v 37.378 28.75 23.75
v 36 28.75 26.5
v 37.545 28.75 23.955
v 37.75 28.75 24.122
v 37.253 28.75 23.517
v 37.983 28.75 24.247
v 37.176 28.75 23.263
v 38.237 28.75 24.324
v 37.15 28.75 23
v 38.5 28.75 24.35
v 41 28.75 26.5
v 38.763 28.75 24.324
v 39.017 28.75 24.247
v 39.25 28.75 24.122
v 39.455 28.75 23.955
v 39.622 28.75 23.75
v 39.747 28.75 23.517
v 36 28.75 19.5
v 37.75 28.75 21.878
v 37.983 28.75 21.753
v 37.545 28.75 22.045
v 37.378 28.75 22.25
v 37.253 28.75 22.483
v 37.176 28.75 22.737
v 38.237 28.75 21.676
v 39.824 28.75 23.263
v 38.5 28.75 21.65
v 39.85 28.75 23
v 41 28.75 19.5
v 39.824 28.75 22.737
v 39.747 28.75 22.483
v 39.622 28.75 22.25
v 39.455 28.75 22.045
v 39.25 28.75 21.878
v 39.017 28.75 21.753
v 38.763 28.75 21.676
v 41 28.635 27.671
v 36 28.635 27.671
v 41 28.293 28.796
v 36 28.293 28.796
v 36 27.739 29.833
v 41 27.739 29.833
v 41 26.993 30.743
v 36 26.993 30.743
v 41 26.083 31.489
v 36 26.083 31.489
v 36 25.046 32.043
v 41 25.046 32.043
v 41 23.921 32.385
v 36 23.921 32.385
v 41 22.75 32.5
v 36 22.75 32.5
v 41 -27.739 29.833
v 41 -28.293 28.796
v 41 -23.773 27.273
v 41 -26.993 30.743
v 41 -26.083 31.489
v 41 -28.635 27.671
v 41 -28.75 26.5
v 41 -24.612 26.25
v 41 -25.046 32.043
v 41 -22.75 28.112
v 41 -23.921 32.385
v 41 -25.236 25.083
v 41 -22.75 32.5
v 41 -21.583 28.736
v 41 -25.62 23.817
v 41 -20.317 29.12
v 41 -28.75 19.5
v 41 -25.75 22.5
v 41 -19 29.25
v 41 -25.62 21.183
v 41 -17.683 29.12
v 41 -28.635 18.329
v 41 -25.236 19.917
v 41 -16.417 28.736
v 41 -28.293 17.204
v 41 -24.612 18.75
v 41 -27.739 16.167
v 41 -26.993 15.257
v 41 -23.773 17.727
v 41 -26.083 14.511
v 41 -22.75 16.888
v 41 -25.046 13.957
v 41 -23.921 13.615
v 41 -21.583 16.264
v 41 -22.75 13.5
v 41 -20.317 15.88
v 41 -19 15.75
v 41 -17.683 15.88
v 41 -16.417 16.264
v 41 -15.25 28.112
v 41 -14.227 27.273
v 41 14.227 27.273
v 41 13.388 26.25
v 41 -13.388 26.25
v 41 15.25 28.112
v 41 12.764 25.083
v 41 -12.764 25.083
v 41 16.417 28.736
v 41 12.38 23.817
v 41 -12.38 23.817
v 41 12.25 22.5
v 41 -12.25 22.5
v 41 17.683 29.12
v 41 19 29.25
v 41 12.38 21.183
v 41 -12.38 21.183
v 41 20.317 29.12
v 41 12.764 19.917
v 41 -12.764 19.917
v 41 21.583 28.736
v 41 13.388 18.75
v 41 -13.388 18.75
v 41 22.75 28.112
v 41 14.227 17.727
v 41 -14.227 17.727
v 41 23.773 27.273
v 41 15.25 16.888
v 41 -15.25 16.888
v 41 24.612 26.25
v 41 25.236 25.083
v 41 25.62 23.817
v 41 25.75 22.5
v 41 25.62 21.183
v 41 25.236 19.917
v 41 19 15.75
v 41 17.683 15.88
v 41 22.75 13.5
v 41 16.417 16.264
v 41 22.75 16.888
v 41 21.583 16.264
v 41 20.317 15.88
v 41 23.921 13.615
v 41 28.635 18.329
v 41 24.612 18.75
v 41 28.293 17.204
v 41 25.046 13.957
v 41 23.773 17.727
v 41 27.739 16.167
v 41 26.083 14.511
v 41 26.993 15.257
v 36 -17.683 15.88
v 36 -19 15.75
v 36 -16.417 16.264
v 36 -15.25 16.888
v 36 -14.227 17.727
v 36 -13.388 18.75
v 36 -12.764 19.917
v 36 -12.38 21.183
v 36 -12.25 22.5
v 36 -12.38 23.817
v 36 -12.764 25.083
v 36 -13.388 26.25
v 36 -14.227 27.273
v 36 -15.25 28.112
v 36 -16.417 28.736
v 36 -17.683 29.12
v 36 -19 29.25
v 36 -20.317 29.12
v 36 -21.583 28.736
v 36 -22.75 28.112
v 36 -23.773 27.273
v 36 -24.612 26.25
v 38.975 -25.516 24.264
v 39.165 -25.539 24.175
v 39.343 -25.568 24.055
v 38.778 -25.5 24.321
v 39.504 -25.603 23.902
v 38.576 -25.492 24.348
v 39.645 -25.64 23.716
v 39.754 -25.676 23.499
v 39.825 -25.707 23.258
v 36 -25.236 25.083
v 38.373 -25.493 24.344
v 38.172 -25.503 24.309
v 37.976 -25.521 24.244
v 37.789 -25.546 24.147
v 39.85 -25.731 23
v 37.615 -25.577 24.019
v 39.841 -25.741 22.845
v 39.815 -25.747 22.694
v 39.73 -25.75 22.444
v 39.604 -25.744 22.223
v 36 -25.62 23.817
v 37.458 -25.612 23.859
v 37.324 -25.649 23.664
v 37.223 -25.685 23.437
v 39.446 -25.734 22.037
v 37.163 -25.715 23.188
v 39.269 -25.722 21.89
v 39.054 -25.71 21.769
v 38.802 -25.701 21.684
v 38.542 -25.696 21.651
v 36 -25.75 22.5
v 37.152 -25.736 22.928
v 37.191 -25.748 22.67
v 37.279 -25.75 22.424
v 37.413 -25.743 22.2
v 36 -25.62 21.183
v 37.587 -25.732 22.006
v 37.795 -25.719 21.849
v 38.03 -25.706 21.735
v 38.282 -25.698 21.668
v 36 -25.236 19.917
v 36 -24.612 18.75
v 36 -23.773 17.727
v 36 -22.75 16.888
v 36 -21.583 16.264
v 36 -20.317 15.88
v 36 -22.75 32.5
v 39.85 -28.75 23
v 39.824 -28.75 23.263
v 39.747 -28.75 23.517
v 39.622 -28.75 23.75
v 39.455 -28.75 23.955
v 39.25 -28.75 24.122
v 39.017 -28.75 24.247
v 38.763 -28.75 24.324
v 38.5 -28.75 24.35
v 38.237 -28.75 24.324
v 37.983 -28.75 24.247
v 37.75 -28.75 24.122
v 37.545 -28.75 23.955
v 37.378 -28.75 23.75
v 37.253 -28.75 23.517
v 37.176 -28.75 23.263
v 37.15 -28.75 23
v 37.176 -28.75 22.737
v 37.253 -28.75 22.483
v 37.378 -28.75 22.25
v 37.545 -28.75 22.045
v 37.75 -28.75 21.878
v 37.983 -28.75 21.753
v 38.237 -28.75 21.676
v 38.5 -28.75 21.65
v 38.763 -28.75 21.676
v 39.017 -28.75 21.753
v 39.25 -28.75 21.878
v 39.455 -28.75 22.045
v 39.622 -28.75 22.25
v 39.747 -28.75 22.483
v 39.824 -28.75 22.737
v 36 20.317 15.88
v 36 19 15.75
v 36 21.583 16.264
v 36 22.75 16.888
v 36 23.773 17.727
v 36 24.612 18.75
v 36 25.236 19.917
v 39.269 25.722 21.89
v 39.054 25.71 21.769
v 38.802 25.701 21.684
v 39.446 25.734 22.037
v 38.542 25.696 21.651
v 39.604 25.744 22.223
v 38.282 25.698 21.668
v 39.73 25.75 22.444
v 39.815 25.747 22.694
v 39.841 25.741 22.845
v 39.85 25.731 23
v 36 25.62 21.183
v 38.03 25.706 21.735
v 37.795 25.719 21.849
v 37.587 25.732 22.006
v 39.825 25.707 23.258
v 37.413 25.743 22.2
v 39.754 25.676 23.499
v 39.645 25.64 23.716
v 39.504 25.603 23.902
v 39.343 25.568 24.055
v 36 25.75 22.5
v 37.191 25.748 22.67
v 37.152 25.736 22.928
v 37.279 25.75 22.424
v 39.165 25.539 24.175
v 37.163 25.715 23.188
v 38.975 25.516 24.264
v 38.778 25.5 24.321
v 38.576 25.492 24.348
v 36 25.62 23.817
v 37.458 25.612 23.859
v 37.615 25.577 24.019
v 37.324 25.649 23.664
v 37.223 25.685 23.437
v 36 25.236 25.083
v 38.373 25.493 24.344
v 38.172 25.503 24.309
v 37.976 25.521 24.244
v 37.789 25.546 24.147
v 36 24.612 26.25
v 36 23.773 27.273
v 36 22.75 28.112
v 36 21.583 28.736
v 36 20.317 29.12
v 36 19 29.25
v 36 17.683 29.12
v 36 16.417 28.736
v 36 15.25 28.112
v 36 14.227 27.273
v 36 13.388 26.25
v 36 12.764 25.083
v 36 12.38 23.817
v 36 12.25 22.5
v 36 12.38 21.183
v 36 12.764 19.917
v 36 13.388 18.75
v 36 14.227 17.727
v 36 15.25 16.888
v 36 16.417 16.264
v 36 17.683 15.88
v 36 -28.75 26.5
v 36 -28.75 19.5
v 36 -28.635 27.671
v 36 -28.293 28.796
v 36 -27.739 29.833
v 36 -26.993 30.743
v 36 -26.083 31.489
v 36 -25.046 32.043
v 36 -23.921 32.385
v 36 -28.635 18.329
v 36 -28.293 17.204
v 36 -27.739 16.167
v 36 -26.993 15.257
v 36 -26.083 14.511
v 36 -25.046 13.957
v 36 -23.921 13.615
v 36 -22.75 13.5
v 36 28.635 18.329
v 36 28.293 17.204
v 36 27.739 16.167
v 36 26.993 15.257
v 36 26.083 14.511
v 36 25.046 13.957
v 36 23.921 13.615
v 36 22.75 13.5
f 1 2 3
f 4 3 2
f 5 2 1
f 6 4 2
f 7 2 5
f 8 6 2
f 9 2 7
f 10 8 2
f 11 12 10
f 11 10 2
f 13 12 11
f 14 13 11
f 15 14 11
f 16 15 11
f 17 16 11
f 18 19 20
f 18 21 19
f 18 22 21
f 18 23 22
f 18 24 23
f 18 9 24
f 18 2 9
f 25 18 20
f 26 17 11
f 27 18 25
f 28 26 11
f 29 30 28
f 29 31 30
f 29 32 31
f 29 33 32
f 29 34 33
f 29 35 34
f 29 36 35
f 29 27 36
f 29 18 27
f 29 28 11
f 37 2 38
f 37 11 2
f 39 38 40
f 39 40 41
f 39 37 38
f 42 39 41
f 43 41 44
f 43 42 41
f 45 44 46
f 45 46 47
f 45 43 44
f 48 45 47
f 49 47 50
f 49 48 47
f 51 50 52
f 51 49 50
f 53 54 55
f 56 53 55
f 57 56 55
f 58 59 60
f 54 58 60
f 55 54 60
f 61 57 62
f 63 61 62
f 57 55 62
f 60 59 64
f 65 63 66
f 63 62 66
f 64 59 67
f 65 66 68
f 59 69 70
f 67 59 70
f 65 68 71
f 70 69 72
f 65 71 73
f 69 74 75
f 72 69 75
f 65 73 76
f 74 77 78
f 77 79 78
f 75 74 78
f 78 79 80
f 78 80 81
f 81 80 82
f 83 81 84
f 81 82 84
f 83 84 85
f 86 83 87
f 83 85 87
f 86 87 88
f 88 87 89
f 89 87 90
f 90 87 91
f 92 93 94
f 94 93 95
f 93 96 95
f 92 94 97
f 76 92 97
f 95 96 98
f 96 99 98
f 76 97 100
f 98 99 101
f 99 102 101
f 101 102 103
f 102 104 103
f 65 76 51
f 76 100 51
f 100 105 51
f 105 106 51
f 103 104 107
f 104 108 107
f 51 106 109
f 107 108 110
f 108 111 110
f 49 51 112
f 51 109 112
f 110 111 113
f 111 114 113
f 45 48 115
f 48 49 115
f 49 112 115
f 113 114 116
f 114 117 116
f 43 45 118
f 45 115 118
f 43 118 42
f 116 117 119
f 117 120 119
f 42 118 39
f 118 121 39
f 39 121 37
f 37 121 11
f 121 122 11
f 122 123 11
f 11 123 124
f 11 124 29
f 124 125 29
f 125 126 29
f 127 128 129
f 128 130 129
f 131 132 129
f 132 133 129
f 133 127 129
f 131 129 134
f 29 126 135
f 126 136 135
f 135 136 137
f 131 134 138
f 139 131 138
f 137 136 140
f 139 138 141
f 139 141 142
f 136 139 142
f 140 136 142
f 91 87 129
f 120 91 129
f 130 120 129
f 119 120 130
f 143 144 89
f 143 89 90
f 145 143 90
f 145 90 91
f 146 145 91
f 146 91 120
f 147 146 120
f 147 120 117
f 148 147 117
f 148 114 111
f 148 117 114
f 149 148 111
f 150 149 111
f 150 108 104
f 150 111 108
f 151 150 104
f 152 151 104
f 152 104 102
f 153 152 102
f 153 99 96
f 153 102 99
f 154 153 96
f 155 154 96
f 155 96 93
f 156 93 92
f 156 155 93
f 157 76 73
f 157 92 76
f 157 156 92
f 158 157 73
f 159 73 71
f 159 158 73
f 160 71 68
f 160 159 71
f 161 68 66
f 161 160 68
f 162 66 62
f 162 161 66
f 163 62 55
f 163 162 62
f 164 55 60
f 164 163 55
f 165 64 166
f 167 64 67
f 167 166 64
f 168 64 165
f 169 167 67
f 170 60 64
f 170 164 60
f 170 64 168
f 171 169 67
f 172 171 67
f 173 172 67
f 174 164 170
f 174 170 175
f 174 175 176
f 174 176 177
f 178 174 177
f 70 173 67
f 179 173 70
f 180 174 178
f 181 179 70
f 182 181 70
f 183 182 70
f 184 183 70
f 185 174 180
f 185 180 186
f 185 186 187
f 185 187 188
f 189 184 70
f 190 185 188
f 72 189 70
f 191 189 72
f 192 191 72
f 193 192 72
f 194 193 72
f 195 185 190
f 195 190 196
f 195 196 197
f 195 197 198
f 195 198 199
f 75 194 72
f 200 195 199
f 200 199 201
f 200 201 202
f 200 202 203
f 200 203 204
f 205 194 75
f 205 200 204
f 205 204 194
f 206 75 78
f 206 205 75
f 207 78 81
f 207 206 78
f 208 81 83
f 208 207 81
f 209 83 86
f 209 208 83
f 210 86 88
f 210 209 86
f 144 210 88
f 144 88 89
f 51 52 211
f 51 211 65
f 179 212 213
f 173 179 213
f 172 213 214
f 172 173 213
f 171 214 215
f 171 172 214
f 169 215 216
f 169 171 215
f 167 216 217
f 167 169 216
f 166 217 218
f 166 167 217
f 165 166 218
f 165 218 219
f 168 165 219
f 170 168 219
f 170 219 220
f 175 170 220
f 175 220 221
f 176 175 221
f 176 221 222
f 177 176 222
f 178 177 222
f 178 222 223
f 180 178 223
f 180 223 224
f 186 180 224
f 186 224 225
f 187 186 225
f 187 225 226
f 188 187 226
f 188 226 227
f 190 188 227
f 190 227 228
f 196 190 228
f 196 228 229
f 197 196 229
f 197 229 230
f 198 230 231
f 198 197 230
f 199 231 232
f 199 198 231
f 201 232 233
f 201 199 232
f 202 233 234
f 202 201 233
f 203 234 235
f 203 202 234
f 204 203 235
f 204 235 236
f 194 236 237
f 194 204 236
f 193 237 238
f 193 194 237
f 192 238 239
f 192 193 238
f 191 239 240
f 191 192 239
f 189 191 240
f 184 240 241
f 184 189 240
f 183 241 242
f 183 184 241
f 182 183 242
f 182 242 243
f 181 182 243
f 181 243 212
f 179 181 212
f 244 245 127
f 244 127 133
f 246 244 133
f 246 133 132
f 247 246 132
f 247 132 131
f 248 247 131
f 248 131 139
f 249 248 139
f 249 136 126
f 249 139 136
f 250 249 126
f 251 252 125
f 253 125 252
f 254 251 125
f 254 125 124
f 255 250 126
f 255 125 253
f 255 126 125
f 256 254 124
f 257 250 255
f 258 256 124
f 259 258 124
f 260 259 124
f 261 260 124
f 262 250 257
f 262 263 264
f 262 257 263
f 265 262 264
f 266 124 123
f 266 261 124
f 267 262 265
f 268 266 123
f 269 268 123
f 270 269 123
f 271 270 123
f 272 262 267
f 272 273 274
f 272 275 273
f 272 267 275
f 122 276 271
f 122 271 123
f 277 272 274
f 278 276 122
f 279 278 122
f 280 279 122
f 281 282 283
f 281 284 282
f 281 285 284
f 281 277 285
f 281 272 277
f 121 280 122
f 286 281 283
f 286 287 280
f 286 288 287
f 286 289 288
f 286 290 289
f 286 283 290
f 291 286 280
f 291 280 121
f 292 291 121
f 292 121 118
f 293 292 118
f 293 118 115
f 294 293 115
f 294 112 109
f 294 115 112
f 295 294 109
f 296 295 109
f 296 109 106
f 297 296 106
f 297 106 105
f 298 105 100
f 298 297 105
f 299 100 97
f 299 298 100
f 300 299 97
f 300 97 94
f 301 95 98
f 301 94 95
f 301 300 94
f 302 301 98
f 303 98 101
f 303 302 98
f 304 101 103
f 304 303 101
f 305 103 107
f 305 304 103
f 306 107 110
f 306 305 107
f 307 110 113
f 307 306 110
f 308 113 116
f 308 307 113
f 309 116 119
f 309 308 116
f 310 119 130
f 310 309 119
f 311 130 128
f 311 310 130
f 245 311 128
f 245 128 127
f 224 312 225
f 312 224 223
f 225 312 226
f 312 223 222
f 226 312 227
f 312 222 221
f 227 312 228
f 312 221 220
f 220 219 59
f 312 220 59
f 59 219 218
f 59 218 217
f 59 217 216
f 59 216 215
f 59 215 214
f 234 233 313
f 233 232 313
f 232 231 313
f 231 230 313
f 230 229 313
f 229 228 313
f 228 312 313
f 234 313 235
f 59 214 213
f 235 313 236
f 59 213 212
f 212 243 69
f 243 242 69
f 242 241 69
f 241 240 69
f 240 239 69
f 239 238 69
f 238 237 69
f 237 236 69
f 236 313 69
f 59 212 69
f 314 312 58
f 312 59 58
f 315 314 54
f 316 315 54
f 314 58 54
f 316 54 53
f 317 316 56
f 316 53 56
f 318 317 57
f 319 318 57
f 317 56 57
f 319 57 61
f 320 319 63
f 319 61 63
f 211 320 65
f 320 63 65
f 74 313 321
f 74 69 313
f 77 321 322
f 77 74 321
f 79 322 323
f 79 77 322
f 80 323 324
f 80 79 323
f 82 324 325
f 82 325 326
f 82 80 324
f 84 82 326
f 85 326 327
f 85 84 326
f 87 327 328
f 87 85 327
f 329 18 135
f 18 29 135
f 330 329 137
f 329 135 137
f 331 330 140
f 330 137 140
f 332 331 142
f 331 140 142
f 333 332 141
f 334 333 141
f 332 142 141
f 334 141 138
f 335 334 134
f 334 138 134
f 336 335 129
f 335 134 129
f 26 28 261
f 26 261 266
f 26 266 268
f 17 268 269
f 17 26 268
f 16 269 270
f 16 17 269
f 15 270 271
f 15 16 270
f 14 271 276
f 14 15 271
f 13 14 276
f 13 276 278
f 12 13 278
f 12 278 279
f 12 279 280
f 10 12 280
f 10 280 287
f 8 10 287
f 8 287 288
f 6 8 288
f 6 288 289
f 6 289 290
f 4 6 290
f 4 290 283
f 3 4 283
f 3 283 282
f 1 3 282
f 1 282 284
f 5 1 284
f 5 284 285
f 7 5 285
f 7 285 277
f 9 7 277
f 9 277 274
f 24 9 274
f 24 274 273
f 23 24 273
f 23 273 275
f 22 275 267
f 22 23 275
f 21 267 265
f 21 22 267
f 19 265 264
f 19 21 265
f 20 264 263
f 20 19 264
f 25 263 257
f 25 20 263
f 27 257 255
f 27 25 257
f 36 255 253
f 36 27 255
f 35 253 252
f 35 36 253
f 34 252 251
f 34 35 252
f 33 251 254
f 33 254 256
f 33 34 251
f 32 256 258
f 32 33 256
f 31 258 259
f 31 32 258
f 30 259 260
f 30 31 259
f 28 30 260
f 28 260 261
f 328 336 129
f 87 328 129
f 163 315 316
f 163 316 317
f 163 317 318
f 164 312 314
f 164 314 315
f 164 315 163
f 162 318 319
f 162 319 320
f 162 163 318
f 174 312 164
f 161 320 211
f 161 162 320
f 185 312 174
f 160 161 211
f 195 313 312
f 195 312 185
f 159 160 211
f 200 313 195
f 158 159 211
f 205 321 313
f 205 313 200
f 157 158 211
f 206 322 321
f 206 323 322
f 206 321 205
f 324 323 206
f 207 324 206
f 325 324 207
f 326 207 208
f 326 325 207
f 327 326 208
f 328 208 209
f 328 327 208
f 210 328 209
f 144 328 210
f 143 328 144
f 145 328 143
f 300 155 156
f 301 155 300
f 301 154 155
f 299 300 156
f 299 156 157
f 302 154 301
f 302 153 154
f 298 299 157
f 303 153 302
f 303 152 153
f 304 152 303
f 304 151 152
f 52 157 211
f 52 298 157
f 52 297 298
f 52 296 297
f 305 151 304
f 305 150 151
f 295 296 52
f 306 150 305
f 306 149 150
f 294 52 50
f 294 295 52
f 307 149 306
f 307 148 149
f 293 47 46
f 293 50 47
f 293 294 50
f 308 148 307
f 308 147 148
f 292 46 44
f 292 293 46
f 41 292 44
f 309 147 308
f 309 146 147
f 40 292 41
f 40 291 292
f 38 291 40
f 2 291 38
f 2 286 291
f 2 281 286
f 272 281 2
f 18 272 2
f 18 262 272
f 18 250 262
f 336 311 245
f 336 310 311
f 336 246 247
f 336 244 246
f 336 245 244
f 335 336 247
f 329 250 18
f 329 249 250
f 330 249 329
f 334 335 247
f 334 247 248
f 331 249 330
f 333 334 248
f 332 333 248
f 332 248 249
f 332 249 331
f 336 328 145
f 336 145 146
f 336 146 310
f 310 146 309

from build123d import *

# Parameters (mm, degrees)
CYLINDER022_R     = 1.35
CYLINDER022_DEPTH = 10
CYLINDER021_R     = 1.35
CYLINDER021_DEPTH = 10
CYLINDER020_R     = 6.75
CYLINDER020_DEPTH = 50
CYLINDER019_R     = 6.75
CYLINDER019_DEPTH = 50
BOX005_W          = 5
BOX005_H          = 57.5
BOX005_DEPTH      = 19
FILLET007_R       = 6


with BuildPart() as cylinder017:
    # Cylinder022 → Cylinder022 (new body)
    with BuildSketch(Plane(origin=(2.5, -22, 23), x_dir=(1, 0, 0), z_dir=(0, -1, 0))):
        Circle(CYLINDER022_R)
    extrude(amount=CYLINDER022_DEPTH)


with BuildPart() as cylinder016:
    # Cylinder021 → Cylinder021 (new body)
    with BuildSketch(Plane(origin=(2.5, 32, 23), x_dir=(1, 0, 0), z_dir=(0, -1, 0))):
        Circle(CYLINDER021_R)
    extrude(amount=CYLINDER021_DEPTH)


with BuildPart() as tubo004:
    # Cylinder020 → Cylinder020 (new body)
    with BuildSketch(Plane(origin=(-24, 19, 22.5), x_dir=(0, 0, -1), z_dir=(1, 0, 0))):
        Circle(CYLINDER020_R)
    extrude(amount=CYLINDER020_DEPTH)


with BuildPart() as tubo003:
    # Cylinder019 → Cylinder019 (new body)
    with BuildSketch(Plane(origin=(-24, -19, 22.5), x_dir=(0, 0, -1), z_dir=(1, 0, 0))):
        Circle(CYLINDER019_R)
    extrude(amount=CYLINDER019_DEPTH)


with BuildPart() as soporte_separador_tubos:
    # Box005 → Box005 (new body)
    with BuildSketch(Plane(origin=(0, -28.75, 13.5), x_dir=(1, 0, 0), z_dir=(0, 0, 1))):
        with Locations((2.5, 28.75)):
            Rectangle(BOX005_W, BOX005_H)
    extrude(amount=BOX005_DEPTH)

    # Fillet007
    fillet007_edges = [soporte_separador_tubos.edges().sort_by_distance(p)[0] for p in [
        (2.5, -28.75, 13.5),
        (2.5, -28.75, 32.5),
        (2.5, 28.75, 13.5),
        (2.5, 28.75, 32.5),
    ]]
    fillet(fillet007_edges, radius=FILLET007_R)

    # Cut016: cut tubo003
    add(tubo003.part, mode=Mode.SUBTRACT)

    # Cut017: cut tubo004
    add(tubo004.part, mode=Mode.SUBTRACT)

    # Cut018: cut Cylinder016
    add(cylinder016.part, mode=Mode.SUBTRACT)

    # Cut019: cut Cylinder017
    add(cylinder017.part, mode=Mode.SUBTRACT)


with BuildPart() as soporte_separador_tubos_1:
    # Cut019 placement: moved
    add(soporte_separador_tubos.part.moved(Location((36, 0, 0))))


solid = soporte_separador_tubos_1.part
